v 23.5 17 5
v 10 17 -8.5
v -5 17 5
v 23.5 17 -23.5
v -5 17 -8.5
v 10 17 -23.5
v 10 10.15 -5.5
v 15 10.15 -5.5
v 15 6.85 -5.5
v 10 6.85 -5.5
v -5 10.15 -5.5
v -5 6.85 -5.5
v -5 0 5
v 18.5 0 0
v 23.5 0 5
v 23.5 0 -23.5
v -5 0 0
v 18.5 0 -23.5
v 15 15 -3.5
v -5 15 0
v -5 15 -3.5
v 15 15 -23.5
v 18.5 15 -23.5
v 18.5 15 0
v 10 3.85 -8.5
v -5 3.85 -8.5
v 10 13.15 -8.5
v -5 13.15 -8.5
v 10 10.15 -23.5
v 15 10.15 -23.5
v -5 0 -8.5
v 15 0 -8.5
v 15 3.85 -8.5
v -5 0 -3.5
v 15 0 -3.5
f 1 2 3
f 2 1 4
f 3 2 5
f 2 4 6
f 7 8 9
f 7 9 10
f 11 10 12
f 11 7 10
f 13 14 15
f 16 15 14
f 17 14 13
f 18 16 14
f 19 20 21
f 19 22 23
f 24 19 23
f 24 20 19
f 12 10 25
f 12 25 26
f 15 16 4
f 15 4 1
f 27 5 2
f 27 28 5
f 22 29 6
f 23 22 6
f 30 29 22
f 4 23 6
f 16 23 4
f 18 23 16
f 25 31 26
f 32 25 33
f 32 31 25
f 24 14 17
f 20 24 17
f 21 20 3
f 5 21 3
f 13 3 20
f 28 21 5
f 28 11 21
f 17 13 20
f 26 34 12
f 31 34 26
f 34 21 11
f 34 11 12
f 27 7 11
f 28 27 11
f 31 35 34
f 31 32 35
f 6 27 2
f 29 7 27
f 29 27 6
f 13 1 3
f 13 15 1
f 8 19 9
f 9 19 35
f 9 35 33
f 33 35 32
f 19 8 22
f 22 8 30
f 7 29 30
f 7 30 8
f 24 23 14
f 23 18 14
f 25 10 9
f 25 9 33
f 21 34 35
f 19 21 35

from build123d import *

# Parameters (mm, degrees)
BOSS_EXTRUDE1_DEPTH = 15
SKETCH2_W           = 19.139819484
SKETCH2_H           = 3.3
CUT_EXTRUDE1_DEPTH  = 3
CHAMFER1_SIZE       = 3
BOSS_EXTRUDE2_DEPTH = 2
CUT_EXTRUDE2_DEPTH  = 15
CUT_EXTRUDE3_DEPTH  = 8.5


with BuildPart() as part:
    # Sketch1 → Boss-Extrude1 (new body)
    with BuildSketch(Plane(origin=(0, 0, 0), x_dir=(1, 0, 0), z_dir=(0, 1, 0))):
        Polygon((-5, 8.5), (10, 8.5), (10, 23.5), (23.5, 23.5), (23.5, -5), (-5, -5), align=None)
        Polygon((0, 0), (0, 3.5), (15, 3.5), (15, 18.5), (18.5, 18.5), (18.5, 0), align=None, mode=Mode.SUBTRACT)
    extrude(amount=BOSS_EXTRUDE1_DEPTH)

    # Sketch2 → Cut-Extrude1 (cut)
    with BuildSketch(Plane(origin=(0, 0, -8.5), x_dir=(-1, 0, 0), z_dir=(0, 0, -1))):
        with Locations((-0.430090258, 8.5)):
            Rectangle(SKETCH2_W, SKETCH2_H)
    extrude(amount=-CUT_EXTRUDE1_DEPTH, mode=Mode.SUBTRACT)

    # Chamfer1
    chamfer1_edges = [part.edges().sort_by_distance(p)[0] for p in [
        (2.5, 6.85, -8.5),
        (2.5, 10.15, -8.5),
    ]]
    chamfer(chamfer1_edges, length=CHAMFER1_SIZE - 0.0001)  # a hair under: the kernel refuses the full size

    # Sketch4 → Boss-Extrude2 (add)
    with BuildSketch(Plane(origin=(0, 15, 0), x_dir=(1, 0, 0), z_dir=(0, 1, 0))):
        Polygon((-5, 8.5), (10, 8.5), (10, 23.5), (23.5, 23.5), (23.5, -5), (-5, -5), align=None)
    extrude(amount=BOSS_EXTRUDE2_DEPTH)

    # Sketch5 → Cut-Extrude2 (cut)
    with BuildSketch(Plane.XZ):
        Polygon((0, 0), (-5, 0), (-5, -3.5), (15, -3.5), (15, -24.324803995), (18.5, -24.324803995), (18.5, 0), align=None)
    extrude(amount=-CUT_EXTRUDE2_DEPTH, mode=Mode.SUBTRACT)

    # Sketch6 → Cut-Extrude3 (cut)
    with BuildSketch(Plane.ZY.offset(-10)):
        Polygon((-5.5, 10.15), (-5.5, 6.85), (-8.5, 3.85), (-8.5, 0), (-23.5, 0), (-23.5, 10.15), align=None)
    extrude(amount=-CUT_EXTRUDE3_DEPTH, mode=Mode.SUBTRACT)


solid = part.part
